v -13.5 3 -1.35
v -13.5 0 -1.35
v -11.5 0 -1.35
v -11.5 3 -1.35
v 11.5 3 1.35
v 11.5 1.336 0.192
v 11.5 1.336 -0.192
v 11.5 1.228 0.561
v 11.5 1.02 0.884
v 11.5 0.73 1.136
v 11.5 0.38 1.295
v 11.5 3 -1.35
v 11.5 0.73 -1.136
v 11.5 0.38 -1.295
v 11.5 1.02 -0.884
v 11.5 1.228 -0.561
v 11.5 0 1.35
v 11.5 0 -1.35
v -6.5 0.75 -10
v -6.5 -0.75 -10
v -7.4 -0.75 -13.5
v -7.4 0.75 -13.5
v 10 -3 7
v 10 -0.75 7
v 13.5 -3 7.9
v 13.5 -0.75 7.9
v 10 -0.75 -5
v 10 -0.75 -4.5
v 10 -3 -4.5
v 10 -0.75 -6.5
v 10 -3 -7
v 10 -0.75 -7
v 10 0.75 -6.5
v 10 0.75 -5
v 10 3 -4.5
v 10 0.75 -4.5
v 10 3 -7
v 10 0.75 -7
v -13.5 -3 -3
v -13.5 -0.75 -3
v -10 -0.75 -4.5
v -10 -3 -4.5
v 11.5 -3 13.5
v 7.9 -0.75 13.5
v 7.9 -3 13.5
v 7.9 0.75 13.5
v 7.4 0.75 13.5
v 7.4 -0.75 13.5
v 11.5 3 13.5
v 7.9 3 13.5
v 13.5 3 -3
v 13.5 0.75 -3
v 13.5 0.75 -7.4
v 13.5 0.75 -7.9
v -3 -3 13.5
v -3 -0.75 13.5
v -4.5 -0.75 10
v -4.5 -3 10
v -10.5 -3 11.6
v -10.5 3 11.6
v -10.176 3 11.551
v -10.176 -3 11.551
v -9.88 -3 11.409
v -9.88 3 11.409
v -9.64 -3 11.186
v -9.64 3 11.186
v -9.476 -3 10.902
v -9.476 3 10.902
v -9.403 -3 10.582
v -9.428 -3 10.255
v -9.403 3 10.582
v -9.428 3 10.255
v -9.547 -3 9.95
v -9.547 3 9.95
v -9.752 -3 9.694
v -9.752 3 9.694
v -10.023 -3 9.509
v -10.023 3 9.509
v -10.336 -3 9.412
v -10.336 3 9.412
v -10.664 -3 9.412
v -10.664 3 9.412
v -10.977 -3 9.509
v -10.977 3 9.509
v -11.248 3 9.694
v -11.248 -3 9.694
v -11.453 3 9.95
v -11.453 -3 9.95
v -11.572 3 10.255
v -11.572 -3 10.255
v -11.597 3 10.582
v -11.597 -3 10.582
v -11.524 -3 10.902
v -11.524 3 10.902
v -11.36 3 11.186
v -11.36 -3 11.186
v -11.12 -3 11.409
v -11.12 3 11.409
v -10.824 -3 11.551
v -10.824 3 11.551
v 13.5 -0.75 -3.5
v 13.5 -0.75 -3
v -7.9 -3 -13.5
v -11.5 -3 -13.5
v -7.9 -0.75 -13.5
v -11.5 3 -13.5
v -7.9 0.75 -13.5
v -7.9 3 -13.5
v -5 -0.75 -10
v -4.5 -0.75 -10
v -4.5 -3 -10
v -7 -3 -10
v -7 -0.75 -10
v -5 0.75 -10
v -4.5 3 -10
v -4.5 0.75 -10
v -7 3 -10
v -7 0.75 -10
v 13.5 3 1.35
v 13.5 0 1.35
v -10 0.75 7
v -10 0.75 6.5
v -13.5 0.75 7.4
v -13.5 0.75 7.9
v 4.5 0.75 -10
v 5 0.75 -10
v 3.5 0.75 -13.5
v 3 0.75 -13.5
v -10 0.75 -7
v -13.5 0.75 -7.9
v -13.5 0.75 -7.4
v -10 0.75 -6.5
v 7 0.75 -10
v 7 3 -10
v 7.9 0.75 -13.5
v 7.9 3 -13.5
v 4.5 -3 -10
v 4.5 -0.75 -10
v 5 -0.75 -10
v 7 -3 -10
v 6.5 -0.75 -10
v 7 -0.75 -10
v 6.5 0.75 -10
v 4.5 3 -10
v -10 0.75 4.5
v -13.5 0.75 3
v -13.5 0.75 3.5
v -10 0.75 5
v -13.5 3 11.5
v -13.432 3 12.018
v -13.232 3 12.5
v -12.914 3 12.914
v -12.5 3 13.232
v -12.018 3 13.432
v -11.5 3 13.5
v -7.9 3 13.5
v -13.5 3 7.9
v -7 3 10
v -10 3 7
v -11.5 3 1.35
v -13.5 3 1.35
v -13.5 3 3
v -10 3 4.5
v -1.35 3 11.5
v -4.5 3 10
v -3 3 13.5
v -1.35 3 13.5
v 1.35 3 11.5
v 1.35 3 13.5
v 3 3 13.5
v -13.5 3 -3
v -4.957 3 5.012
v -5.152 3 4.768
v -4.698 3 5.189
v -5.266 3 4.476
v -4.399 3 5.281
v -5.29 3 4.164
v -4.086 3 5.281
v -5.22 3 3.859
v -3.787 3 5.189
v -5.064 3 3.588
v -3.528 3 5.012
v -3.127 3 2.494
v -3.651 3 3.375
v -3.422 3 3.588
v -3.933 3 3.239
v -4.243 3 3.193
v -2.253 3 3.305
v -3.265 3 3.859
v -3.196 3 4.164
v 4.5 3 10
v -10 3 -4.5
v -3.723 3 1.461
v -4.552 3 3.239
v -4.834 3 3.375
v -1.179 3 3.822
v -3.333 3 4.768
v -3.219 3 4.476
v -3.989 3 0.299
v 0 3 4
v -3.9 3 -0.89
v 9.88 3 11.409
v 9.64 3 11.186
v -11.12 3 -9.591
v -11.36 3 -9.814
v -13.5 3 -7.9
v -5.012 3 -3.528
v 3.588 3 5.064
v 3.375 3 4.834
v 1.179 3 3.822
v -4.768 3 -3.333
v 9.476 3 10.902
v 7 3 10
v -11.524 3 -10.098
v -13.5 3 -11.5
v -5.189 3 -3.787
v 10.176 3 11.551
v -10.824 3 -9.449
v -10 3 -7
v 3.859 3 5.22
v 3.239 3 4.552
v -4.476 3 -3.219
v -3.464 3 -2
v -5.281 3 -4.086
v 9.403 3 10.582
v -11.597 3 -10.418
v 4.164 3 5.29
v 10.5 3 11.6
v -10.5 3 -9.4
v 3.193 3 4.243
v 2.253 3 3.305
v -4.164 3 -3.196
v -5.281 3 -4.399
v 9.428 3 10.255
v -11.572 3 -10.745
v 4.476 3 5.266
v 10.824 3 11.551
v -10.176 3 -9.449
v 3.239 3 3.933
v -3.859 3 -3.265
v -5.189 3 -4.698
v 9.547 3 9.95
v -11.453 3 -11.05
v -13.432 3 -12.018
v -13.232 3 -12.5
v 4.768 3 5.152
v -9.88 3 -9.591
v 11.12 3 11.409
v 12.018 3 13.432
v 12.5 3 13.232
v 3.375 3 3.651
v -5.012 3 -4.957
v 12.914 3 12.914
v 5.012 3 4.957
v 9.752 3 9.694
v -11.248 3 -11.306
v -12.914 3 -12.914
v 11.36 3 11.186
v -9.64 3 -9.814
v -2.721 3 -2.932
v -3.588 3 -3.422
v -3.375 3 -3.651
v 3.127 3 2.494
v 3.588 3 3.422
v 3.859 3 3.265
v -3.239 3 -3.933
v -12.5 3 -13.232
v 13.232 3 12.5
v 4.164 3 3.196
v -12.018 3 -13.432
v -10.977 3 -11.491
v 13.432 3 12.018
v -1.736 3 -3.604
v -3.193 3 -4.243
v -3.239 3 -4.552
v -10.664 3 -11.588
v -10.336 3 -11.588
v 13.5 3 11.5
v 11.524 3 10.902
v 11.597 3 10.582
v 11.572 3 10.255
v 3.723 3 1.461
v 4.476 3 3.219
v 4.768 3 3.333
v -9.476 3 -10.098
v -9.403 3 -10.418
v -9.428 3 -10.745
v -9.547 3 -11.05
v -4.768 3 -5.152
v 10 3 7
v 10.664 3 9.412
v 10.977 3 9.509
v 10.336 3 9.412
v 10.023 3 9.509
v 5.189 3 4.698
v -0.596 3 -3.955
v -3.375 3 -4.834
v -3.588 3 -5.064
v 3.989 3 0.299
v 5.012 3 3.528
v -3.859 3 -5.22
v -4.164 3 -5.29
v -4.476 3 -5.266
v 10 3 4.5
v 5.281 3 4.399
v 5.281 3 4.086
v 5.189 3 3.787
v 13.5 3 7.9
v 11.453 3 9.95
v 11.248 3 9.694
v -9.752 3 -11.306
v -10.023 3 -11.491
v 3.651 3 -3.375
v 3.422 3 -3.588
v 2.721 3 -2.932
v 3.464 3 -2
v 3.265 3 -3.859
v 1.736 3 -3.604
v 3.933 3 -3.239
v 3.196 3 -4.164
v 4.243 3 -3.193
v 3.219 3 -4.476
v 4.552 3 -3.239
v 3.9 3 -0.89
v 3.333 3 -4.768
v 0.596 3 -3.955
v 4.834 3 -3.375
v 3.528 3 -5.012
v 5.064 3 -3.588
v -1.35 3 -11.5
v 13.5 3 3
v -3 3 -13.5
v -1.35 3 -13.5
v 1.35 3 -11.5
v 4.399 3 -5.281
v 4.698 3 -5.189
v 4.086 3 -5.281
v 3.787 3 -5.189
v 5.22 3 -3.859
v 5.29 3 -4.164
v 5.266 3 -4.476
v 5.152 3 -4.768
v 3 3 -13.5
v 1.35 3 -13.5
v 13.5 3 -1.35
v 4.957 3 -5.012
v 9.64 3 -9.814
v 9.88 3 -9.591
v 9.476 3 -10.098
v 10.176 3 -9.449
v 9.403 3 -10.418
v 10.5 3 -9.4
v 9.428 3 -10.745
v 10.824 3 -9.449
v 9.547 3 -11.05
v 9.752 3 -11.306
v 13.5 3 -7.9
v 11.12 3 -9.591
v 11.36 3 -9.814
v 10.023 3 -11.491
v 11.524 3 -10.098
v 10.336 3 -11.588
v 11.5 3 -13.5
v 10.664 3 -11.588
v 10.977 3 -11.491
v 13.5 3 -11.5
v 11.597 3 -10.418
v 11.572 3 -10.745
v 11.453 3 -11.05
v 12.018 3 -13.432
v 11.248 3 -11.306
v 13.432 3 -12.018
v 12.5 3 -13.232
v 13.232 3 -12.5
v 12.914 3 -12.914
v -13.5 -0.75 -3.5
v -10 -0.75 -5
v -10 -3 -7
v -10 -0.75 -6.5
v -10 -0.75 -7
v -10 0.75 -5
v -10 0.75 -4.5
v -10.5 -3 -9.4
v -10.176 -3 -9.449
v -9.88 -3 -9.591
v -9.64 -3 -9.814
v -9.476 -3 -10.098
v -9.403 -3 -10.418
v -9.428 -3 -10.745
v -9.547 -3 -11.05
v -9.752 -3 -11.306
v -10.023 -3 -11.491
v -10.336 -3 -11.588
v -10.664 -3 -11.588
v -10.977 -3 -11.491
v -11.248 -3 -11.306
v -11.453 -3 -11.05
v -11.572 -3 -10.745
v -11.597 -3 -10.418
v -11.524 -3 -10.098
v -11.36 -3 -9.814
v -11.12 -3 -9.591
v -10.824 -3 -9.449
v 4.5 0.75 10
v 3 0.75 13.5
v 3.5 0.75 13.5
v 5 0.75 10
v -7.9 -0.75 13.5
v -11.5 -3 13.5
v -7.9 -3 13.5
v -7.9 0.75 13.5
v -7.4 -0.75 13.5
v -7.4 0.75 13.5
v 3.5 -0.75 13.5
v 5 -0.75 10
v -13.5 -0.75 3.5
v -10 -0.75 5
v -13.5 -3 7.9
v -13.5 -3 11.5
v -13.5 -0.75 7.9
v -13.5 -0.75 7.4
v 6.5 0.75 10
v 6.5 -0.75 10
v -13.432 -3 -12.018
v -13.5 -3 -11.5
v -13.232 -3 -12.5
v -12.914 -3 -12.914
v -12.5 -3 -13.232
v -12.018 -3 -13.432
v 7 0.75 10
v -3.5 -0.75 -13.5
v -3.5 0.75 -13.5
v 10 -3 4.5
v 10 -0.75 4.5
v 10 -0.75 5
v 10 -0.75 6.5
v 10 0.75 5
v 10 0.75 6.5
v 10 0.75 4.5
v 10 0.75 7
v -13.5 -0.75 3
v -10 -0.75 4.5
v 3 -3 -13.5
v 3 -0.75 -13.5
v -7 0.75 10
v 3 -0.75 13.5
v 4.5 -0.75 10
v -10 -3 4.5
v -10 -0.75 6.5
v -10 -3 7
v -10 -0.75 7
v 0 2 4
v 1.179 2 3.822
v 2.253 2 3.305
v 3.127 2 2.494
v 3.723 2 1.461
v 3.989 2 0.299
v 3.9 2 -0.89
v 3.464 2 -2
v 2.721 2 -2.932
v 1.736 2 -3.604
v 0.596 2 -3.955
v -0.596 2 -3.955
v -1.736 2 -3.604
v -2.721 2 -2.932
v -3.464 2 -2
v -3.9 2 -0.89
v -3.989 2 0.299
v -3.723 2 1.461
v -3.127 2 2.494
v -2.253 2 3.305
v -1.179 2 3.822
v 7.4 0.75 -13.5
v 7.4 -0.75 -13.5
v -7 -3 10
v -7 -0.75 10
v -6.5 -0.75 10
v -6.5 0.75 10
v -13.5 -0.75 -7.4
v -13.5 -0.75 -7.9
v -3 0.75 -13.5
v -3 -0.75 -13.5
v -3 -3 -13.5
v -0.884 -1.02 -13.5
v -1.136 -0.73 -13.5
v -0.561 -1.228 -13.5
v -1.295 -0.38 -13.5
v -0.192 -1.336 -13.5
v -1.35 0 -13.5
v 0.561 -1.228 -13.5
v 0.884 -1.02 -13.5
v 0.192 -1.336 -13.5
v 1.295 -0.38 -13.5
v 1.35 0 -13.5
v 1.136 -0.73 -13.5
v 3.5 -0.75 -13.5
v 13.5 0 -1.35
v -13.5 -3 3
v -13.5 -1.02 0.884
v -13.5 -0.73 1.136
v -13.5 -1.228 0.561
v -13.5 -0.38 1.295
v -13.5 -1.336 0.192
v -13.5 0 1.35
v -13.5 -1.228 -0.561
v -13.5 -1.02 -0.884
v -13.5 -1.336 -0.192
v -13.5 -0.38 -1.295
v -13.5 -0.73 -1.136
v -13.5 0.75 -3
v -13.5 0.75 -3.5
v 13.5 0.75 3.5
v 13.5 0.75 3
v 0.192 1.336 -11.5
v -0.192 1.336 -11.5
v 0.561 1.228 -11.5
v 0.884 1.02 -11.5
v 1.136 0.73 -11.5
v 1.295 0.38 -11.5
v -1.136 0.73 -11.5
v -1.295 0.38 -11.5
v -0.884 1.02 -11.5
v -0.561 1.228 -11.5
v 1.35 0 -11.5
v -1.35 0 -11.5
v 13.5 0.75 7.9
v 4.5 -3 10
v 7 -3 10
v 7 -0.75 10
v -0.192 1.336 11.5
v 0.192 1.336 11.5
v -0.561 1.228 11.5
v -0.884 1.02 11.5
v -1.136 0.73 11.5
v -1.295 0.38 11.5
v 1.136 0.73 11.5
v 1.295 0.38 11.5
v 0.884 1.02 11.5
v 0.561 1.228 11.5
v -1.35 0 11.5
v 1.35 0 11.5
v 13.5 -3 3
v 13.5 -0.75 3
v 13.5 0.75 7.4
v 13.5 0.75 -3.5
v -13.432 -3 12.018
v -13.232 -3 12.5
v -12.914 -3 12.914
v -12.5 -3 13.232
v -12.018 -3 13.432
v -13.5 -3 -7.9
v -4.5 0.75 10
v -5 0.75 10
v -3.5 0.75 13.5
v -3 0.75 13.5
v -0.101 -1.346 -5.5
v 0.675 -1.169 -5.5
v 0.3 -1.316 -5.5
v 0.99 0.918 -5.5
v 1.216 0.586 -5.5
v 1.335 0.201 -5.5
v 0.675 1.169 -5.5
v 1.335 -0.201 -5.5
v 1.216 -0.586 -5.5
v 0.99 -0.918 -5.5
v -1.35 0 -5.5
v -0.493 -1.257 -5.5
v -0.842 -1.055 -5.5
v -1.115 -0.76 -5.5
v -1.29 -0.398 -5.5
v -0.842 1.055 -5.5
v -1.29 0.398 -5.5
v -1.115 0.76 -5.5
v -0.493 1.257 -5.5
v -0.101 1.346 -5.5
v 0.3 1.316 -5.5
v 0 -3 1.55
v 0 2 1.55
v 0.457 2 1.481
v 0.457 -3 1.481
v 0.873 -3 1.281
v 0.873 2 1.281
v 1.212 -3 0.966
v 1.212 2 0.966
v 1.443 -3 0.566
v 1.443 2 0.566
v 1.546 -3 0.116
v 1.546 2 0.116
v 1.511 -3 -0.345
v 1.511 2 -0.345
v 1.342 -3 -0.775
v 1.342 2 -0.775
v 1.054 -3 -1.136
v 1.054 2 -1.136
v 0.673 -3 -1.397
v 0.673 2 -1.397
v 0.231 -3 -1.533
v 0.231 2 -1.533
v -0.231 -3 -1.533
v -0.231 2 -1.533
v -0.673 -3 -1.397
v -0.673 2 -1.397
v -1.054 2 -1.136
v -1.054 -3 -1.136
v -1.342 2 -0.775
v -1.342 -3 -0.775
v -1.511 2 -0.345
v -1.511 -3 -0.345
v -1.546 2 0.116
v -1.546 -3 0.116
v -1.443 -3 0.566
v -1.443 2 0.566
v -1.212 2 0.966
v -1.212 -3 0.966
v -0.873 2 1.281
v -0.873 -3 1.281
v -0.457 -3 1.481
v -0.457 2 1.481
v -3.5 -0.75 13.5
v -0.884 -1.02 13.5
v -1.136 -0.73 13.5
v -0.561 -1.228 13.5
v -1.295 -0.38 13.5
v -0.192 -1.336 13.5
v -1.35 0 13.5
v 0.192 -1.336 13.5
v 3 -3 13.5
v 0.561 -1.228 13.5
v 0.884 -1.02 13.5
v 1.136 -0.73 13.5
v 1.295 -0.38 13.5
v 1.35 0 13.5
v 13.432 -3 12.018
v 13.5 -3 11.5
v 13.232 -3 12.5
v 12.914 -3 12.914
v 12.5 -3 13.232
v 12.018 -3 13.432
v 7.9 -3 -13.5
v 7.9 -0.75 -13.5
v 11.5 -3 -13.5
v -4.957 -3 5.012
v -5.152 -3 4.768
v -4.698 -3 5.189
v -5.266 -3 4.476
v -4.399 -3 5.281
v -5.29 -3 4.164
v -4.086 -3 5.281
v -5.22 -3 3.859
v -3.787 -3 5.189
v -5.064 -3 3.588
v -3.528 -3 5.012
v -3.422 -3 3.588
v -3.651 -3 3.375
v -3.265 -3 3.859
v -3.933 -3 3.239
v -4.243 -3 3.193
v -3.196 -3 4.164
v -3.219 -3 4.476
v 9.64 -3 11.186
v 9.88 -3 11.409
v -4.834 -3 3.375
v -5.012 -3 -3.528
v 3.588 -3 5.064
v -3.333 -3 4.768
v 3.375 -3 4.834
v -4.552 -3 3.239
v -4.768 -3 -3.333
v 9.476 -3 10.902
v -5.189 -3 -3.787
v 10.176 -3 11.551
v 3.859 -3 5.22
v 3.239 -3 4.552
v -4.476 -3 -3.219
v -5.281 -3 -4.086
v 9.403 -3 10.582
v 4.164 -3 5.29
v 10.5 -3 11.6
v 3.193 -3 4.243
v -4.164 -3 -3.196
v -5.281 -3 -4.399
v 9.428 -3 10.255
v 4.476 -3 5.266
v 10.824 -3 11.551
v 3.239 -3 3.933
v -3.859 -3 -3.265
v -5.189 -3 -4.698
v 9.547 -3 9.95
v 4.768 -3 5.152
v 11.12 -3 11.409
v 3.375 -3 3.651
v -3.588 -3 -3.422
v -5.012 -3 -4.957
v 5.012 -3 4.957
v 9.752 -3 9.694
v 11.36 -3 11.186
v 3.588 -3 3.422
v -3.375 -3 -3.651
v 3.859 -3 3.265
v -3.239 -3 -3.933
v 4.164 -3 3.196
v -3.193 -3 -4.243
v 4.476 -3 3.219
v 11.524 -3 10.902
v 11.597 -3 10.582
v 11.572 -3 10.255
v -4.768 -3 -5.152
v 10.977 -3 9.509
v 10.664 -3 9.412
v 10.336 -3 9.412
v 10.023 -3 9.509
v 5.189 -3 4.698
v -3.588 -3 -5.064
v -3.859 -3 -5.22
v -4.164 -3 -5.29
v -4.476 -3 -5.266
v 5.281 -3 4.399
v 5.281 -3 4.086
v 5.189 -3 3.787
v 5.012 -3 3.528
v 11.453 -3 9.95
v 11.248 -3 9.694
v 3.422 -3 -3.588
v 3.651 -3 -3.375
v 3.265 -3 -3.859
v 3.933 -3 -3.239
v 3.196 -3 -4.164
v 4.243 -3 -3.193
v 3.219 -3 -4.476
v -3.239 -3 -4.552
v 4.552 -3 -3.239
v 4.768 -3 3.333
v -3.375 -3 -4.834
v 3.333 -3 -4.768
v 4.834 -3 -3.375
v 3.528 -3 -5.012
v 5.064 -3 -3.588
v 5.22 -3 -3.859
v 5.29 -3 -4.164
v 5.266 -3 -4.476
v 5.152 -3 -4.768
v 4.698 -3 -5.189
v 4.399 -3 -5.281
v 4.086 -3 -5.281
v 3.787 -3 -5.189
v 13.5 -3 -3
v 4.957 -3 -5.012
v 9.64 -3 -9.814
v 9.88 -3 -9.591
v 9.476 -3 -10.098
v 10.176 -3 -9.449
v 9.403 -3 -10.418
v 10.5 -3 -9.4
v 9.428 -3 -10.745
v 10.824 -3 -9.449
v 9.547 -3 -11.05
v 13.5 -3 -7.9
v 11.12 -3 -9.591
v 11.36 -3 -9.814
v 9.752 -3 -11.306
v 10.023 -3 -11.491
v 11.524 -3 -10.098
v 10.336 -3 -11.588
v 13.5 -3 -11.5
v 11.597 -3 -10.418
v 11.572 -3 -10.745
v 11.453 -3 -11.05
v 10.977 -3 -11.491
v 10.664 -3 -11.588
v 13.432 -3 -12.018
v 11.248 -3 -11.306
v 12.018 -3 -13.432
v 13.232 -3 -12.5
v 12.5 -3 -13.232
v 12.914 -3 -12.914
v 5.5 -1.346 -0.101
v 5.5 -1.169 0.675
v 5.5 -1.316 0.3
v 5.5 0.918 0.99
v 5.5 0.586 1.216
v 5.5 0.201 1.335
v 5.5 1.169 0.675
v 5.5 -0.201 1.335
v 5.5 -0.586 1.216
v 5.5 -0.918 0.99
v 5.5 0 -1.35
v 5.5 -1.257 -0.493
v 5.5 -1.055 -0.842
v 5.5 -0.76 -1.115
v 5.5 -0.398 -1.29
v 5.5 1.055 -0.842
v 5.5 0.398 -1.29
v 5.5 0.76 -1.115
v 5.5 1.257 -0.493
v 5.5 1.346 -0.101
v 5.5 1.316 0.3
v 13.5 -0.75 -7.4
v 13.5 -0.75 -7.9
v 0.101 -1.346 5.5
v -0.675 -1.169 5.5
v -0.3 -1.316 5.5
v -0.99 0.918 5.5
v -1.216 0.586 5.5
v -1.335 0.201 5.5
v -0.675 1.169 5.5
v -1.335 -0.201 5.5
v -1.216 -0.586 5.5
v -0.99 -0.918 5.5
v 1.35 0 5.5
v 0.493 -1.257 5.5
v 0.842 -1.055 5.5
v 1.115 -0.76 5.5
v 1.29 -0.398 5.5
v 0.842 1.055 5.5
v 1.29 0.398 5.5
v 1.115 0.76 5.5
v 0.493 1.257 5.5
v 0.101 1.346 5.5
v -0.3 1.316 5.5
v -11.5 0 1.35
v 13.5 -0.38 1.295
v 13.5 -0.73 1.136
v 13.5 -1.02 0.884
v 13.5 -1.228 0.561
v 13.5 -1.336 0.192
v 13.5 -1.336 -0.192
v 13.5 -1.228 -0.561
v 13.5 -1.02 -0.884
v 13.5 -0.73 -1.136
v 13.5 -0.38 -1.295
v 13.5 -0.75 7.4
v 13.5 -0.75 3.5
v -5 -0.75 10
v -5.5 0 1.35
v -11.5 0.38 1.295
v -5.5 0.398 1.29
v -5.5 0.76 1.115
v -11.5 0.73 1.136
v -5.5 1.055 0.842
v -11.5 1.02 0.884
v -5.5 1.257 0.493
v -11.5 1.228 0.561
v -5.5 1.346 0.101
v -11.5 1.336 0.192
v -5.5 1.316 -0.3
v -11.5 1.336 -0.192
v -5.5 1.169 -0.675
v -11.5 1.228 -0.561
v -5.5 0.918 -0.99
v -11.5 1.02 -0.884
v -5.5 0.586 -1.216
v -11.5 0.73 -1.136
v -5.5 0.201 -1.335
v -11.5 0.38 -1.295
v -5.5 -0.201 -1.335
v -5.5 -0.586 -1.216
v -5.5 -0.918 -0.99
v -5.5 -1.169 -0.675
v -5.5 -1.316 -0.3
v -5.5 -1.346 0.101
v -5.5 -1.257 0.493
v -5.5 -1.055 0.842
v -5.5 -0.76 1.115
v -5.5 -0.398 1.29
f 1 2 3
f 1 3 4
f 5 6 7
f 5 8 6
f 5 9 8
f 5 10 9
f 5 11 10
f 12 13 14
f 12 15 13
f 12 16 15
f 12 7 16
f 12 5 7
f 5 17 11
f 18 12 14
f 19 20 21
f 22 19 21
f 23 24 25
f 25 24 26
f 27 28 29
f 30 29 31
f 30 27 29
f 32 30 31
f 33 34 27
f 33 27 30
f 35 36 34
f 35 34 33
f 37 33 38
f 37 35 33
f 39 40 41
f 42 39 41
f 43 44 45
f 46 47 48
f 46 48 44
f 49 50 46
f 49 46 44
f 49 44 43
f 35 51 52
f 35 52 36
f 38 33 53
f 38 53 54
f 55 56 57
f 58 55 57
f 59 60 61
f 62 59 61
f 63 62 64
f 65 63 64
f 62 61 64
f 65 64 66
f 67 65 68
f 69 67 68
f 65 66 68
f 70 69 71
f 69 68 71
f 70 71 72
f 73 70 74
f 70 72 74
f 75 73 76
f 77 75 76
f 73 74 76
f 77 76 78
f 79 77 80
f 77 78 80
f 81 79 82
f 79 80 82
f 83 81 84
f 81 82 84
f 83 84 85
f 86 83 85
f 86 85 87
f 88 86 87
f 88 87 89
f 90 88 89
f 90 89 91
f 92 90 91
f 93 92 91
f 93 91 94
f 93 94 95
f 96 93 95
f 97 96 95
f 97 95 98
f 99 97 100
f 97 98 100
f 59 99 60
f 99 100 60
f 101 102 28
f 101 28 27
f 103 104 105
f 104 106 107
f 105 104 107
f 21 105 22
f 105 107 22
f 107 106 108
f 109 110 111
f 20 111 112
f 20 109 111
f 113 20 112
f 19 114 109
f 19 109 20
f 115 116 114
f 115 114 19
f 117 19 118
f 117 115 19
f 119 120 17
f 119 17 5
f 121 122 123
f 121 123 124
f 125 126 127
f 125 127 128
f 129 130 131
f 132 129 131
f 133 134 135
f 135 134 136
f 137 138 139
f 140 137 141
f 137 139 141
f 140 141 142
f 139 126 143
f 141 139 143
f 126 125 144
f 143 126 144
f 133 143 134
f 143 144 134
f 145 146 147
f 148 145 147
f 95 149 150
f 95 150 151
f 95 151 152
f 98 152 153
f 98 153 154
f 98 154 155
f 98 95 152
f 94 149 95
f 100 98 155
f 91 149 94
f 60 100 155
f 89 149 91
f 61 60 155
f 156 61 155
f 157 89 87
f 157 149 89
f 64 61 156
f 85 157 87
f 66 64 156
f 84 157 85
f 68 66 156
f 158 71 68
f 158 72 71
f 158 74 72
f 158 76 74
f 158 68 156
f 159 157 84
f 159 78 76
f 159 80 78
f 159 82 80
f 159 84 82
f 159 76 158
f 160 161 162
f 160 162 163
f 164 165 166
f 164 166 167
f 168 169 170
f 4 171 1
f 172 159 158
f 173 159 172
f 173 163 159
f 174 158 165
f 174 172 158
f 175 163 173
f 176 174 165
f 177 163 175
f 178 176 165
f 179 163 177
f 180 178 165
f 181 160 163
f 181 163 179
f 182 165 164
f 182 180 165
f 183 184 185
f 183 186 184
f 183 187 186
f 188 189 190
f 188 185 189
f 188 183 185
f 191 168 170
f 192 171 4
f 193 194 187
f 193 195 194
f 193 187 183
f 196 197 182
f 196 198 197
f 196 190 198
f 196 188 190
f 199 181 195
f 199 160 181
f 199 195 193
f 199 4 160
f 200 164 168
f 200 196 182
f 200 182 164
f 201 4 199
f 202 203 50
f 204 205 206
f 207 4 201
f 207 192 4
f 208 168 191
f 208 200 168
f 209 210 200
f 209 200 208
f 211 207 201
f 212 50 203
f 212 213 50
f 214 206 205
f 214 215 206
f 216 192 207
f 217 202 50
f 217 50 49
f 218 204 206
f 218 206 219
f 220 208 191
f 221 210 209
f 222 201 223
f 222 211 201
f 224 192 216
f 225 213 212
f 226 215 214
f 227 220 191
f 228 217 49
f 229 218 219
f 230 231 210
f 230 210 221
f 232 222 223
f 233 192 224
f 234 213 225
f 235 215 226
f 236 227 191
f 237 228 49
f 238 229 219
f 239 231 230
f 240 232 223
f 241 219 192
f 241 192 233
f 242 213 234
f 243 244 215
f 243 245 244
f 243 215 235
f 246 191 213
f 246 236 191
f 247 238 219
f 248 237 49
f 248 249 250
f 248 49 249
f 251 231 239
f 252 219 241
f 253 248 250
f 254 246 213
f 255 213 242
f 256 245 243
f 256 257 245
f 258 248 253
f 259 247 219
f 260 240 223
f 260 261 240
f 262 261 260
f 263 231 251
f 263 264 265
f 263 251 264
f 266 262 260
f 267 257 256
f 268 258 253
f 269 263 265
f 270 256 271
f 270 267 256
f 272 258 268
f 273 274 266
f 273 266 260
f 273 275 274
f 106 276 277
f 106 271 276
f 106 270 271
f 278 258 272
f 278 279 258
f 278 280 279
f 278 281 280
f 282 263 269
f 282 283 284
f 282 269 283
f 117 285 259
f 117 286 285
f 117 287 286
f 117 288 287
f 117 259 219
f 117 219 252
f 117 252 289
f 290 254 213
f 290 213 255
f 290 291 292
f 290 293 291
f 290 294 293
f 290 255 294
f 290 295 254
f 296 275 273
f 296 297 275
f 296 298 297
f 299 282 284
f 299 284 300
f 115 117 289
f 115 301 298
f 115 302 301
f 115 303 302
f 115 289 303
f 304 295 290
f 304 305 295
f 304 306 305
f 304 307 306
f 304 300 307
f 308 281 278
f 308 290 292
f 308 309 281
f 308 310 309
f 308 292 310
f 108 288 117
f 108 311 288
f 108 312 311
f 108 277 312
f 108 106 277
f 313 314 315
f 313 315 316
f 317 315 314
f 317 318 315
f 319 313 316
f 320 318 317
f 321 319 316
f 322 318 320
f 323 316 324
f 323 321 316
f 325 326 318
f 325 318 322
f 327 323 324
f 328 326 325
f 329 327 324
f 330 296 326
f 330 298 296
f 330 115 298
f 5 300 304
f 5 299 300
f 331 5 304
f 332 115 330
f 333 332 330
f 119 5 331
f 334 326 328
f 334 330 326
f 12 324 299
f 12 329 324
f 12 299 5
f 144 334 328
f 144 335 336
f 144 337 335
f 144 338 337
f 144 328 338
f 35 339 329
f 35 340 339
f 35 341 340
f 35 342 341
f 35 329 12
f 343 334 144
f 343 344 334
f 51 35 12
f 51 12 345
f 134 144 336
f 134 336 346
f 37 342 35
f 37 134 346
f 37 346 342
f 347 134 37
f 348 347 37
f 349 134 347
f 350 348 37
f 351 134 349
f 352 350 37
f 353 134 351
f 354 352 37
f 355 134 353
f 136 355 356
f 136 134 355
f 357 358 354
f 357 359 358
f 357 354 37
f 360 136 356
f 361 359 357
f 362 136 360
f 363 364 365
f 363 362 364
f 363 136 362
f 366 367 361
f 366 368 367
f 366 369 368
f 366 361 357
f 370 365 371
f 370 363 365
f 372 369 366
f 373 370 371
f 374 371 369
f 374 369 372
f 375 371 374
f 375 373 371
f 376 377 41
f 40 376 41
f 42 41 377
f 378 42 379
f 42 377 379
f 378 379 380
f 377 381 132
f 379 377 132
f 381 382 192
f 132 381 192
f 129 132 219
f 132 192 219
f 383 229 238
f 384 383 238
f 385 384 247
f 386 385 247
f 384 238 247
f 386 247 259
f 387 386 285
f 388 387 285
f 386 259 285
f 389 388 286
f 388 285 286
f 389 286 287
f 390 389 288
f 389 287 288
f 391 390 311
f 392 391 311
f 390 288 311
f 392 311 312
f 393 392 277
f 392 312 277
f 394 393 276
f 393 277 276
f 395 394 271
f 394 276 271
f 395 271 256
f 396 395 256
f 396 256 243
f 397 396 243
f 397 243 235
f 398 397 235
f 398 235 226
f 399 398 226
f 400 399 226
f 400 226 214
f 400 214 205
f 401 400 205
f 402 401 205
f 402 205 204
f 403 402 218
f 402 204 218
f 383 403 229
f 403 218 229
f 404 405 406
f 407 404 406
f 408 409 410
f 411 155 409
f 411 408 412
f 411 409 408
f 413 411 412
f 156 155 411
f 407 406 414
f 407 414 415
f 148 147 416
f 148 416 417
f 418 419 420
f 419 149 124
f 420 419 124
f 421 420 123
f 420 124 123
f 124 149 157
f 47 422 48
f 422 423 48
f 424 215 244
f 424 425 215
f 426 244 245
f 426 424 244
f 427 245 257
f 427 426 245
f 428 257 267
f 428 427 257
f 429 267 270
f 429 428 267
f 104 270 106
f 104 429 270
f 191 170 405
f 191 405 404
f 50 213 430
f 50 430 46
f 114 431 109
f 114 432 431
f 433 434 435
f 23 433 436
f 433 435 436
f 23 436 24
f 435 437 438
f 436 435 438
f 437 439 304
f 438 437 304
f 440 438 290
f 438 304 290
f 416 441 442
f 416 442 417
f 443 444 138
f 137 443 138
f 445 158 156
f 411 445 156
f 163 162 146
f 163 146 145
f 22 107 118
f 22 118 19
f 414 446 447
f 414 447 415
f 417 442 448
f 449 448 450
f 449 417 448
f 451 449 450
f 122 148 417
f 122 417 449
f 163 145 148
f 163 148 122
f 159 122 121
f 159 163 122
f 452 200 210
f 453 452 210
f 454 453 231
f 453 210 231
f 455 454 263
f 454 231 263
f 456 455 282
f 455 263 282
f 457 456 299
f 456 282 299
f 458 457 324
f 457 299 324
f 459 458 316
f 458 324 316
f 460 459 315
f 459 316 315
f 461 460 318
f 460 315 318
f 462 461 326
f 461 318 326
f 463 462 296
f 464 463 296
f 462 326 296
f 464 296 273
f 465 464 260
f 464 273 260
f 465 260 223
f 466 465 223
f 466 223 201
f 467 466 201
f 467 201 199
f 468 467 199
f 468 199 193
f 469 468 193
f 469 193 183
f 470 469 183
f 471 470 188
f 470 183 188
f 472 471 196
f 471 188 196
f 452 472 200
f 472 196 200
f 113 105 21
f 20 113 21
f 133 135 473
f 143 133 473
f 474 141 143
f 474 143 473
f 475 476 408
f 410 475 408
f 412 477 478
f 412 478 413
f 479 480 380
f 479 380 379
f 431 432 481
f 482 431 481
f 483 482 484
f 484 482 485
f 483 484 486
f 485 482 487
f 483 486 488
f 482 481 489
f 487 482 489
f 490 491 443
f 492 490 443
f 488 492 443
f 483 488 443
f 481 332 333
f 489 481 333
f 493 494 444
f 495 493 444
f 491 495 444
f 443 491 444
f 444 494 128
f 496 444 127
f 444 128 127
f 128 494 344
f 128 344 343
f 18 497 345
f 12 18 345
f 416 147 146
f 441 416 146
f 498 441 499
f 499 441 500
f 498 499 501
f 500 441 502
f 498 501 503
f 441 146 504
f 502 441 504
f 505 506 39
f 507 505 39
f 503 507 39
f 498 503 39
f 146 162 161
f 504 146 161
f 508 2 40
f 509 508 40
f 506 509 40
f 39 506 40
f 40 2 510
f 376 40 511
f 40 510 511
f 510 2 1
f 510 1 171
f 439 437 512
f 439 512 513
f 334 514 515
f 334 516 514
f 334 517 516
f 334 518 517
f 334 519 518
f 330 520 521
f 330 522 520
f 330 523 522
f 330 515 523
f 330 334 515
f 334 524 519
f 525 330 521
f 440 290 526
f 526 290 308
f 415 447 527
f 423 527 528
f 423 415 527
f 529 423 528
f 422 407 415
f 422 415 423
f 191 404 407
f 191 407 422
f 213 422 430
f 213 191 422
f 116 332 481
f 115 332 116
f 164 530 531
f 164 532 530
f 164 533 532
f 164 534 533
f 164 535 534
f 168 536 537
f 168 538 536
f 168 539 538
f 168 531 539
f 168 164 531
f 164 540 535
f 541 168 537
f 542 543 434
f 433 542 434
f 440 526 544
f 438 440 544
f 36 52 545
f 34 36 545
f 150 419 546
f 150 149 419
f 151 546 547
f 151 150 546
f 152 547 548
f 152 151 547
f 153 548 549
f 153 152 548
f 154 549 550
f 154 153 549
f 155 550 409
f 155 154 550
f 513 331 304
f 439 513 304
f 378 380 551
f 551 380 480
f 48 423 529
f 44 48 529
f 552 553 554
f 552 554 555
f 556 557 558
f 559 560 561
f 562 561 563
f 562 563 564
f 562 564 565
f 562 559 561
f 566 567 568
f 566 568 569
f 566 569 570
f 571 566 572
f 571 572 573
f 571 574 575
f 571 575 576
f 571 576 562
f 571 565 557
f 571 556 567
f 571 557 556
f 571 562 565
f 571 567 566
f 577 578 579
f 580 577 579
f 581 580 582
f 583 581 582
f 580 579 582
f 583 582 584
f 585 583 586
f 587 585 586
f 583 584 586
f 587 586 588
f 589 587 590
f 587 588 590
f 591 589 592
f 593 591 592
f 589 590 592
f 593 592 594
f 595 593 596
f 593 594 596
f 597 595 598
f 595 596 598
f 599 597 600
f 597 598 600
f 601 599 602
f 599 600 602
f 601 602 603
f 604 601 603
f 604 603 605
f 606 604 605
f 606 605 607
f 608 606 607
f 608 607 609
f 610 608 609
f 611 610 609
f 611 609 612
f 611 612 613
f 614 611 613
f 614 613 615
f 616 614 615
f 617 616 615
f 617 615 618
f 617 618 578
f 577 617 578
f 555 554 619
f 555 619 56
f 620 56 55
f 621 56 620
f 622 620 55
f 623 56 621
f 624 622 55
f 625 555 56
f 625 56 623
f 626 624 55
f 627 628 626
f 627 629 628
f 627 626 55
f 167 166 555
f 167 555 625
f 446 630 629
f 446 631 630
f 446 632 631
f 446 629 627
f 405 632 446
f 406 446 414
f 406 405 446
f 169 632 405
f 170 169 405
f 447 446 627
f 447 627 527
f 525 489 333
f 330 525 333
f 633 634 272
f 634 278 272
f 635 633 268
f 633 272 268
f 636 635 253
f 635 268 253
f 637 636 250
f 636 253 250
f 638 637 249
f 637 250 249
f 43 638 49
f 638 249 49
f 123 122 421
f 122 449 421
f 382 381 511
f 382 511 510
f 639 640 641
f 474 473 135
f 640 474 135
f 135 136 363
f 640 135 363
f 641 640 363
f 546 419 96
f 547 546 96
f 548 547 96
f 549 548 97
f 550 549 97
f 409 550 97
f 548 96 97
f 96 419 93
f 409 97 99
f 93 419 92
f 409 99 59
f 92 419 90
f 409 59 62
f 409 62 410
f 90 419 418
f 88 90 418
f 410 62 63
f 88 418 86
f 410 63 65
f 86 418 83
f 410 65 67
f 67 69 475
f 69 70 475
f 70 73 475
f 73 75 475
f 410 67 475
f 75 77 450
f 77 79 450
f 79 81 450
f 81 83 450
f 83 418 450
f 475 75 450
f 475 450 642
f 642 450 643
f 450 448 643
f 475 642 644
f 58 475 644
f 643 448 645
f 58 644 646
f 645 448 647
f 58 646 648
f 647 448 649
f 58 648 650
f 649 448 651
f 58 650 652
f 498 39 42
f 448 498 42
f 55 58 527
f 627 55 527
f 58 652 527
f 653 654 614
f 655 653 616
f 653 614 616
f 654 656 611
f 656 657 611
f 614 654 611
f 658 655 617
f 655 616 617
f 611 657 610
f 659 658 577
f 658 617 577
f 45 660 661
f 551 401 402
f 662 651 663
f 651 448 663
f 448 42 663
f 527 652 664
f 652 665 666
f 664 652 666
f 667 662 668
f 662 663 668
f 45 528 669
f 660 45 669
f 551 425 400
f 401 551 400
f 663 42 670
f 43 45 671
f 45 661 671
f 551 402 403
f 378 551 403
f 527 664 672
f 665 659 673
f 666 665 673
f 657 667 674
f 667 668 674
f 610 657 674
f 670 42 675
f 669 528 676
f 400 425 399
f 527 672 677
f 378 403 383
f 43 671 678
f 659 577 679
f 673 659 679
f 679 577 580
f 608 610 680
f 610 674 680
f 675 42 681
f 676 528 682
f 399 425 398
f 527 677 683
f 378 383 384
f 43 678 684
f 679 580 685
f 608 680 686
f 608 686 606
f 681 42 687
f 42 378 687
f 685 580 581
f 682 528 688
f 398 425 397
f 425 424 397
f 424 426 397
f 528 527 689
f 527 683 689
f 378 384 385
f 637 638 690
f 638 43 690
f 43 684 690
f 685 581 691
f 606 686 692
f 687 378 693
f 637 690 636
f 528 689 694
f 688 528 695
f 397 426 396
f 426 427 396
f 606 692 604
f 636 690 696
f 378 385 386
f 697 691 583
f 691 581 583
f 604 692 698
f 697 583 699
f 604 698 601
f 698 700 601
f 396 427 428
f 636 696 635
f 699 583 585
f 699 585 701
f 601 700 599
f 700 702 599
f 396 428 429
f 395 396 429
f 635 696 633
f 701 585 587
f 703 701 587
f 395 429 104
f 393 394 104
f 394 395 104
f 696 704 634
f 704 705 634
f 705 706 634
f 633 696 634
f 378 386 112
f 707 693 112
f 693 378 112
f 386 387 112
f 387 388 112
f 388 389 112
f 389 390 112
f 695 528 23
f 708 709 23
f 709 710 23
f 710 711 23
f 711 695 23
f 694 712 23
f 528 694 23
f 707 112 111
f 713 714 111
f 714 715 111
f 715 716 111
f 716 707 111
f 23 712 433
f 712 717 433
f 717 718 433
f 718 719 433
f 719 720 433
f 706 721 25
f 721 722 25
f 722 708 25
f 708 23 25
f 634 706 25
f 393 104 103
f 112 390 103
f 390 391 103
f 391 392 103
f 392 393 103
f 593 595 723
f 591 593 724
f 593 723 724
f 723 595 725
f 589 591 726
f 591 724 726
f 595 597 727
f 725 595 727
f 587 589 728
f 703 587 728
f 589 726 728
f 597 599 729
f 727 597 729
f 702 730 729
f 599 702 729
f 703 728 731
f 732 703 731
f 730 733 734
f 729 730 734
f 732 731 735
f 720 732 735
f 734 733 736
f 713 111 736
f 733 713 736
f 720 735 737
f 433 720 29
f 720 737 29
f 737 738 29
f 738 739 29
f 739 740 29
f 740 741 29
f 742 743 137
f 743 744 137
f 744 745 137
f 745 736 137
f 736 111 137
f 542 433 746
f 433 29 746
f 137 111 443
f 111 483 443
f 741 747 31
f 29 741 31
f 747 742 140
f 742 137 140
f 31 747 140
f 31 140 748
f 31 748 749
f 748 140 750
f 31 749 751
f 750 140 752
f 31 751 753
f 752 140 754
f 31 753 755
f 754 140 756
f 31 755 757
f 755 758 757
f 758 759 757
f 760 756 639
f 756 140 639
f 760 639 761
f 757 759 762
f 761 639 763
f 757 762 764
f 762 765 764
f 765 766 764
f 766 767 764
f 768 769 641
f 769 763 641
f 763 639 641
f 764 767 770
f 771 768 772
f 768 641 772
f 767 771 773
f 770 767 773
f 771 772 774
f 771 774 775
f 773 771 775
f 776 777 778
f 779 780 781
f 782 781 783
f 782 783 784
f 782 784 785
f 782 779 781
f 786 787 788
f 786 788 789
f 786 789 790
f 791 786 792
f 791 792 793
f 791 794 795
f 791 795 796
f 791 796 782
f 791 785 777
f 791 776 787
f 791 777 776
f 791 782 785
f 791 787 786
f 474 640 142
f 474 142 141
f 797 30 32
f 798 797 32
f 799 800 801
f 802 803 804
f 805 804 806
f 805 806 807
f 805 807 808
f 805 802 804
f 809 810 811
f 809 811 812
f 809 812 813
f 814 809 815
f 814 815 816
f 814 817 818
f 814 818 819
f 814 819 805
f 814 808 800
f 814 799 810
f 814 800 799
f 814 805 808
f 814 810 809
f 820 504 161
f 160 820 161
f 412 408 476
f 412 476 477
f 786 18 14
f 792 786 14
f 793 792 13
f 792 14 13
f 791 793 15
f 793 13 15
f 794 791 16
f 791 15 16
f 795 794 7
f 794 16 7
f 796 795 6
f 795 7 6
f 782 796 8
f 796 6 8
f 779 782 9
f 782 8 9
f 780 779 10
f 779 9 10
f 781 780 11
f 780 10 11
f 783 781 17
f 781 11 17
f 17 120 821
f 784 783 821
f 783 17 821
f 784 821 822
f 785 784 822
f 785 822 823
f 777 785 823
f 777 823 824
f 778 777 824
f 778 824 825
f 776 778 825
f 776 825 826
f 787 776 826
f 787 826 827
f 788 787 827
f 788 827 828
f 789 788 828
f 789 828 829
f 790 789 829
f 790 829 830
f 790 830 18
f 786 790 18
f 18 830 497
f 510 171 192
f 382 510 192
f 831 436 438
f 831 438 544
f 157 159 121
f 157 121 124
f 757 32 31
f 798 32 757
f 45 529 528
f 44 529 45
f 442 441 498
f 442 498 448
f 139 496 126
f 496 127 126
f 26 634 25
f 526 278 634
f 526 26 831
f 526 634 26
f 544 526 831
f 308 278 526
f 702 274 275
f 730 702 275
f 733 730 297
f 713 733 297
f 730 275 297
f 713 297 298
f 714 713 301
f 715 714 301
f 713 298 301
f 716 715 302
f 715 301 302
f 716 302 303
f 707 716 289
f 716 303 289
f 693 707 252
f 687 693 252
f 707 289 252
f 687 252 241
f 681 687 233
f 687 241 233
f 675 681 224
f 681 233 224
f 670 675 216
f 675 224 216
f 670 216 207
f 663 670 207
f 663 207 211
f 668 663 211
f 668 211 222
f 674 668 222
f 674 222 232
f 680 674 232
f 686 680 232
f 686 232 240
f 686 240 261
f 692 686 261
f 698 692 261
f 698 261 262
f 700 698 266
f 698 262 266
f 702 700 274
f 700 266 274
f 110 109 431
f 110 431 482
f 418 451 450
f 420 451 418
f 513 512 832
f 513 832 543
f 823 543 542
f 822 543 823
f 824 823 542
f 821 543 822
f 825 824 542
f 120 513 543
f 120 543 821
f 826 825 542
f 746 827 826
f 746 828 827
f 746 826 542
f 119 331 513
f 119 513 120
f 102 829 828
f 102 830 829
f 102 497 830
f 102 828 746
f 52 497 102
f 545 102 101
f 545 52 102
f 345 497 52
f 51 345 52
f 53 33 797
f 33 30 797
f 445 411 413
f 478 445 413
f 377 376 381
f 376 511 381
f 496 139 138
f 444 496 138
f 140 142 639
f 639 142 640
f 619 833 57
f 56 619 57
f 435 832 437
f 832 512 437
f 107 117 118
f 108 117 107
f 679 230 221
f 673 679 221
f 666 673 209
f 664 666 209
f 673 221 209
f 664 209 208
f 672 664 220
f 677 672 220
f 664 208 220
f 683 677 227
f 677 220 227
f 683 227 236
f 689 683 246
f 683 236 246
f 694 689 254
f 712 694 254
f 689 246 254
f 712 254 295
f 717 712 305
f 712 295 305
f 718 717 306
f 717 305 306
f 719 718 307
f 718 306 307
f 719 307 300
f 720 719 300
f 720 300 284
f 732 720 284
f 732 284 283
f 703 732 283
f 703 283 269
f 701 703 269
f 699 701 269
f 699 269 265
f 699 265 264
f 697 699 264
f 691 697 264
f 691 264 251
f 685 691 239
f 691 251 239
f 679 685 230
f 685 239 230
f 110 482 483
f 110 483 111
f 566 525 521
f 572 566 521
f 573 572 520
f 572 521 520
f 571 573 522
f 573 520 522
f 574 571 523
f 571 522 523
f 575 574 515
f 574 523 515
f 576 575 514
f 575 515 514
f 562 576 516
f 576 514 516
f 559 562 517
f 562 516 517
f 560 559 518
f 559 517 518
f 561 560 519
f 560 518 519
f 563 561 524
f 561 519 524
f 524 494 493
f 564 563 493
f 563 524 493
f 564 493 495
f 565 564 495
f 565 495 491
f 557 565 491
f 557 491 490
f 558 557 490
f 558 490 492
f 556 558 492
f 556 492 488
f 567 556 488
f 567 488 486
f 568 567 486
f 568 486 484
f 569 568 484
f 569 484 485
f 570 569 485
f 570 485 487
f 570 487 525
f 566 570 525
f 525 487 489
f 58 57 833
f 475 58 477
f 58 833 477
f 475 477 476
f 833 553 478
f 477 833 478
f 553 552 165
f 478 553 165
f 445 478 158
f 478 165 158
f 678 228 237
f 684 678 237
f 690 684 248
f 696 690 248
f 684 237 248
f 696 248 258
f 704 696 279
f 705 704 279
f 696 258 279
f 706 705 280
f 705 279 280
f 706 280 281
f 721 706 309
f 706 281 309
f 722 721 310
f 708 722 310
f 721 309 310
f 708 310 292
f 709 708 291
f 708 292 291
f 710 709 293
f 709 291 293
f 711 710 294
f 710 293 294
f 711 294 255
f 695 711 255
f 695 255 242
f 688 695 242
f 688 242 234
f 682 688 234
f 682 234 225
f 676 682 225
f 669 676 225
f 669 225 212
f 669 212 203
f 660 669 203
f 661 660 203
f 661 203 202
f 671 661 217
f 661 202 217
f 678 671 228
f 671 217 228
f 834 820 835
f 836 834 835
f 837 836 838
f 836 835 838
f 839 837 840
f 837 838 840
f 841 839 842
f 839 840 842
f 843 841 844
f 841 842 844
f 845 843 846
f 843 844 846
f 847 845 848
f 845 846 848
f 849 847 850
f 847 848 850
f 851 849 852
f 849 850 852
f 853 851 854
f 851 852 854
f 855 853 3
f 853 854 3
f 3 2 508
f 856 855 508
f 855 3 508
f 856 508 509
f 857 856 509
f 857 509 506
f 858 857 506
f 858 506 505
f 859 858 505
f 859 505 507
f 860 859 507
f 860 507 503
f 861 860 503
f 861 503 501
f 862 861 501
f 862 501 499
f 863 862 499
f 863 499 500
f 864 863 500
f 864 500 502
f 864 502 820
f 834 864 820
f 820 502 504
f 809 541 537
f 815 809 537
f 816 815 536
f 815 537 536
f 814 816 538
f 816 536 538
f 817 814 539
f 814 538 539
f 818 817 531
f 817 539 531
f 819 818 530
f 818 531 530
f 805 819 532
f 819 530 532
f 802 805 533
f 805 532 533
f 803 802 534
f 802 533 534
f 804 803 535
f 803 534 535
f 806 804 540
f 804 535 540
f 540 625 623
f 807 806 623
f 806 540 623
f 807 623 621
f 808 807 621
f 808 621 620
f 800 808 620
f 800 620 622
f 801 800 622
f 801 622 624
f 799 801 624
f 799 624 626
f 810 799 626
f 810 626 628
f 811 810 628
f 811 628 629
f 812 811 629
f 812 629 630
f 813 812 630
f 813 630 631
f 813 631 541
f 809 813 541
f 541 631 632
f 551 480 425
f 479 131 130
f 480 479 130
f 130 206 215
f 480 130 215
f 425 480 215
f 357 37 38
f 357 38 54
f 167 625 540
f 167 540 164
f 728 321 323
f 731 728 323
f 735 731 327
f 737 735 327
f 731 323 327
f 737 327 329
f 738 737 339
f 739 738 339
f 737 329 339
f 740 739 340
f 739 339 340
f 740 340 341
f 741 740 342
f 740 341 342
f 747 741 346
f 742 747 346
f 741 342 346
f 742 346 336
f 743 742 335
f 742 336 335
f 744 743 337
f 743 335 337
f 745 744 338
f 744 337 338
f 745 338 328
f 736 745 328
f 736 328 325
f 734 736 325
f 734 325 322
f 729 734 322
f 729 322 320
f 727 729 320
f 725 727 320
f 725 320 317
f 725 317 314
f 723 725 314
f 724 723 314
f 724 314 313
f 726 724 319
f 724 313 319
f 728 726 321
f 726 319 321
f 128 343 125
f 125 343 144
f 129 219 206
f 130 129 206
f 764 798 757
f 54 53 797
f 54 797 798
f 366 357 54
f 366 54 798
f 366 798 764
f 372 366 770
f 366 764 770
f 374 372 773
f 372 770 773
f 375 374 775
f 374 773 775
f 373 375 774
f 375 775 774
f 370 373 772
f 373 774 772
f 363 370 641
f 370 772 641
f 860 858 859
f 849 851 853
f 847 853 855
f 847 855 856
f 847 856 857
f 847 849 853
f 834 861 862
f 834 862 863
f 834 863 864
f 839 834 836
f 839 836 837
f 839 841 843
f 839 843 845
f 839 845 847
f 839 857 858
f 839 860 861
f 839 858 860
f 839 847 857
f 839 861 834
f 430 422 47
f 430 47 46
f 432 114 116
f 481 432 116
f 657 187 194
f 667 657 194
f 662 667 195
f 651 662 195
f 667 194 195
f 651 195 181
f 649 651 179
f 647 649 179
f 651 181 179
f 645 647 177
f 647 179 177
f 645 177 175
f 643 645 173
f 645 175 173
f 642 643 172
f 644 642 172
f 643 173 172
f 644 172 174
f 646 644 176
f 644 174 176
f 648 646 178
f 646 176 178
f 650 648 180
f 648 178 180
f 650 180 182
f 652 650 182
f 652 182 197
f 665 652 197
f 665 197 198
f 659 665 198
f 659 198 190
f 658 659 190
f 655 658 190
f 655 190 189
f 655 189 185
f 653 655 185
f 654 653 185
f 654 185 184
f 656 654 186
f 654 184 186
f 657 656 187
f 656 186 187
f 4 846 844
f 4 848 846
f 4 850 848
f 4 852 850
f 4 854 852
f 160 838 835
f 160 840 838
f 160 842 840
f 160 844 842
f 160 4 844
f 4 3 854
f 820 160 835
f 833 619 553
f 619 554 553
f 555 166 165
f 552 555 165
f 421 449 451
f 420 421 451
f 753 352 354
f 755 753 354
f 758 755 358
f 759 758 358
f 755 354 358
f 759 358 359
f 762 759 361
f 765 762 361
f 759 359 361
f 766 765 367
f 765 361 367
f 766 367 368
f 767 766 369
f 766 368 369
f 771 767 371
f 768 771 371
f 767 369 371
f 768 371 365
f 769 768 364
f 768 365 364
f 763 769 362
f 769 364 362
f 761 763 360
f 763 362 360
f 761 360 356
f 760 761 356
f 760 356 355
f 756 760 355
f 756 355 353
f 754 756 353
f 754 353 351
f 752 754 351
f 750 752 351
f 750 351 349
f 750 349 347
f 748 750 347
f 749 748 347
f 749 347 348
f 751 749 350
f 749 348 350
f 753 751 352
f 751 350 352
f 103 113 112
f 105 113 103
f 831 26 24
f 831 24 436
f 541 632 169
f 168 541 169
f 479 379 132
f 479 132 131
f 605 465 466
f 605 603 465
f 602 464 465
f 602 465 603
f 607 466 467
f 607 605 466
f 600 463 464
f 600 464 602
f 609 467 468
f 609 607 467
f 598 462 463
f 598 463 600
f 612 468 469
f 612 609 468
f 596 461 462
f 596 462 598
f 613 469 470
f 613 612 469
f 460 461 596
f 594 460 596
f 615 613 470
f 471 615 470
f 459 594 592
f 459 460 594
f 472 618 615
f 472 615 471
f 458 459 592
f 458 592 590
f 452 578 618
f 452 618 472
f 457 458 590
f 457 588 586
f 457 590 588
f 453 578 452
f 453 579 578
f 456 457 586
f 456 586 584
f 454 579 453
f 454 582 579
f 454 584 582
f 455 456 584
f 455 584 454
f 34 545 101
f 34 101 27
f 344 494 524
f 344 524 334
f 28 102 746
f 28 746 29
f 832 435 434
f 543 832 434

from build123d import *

# Parameters (mm, degrees)
SKETCH_3_W                      = 27
SKETCH_3_H                      = 27
EXTRUDE_1_DEPTH                 = 3
FILLET_1_R                      = 2
SKETCH_4_R                      = 1.1
CUT_EXTRUDE_1_DEPTH             = 6
SKETCH_5_R                      = 1.55
CUT_EXTRUDE_2_DEPTH             = 6
SKETCH_6_R                      = 1.05
CUT_EXTRUDE_3_DEPTH             = 6
PATTERN_CIRCULAR_1_COUNT        = 4
SKETCH_7_R                      = 4
CUT_EXTRUDE_4_DEPTH             = 1
CUT_EXTRUDE_8_DEPTH             = 21.012496096
PATTERN_CIRCULAR_2_COUNT        = 4
PATTERN_CIRCULAR_2_COPY_1_DEPTH = 21.012496096
PATTERN_CIRCULAR_2_COPY_2_DEPTH = 21.012496096
PATTERN_CIRCULAR_2_COPY_3_DEPTH = 21.012496096
SKETCH_12_R                     = 1.35
CUT_EXTRUDE_9_DEPTH             = 8
PATTERN_CIRCULAR_3_COUNT        = 4
EXTRUDE_2_DEPTH                 = 0.75
PATTERN_CIRCULAR_4_COUNT        = 4
PATTERN_CIRCULAR_4_COPY_1_DEPTH = 0.75
PATTERN_CIRCULAR_4_COPY_2_DEPTH = 0.75
PATTERN_CIRCULAR_4_COPY_3_DEPTH = 0.75
SKETCH_22_W                     = 2.7
SKETCH_22_H                     = 3
CUT_EXTRUDE_15_DEPTH            = 2
PATTERN_CIRCULAR_11_COUNT       = 4


with BuildPart() as part:
    # ｽｹｯﾁ3 → ﾎﾞｽ - 押し出し1 (new, symmetric)
    with BuildSketch(Plane(origin=(0, 0, 0), x_dir=(1, 0, 0), z_dir=(0, 1, 0))):
        Rectangle(SKETCH_3_W, SKETCH_3_H)
    extrude(amount=EXTRUDE_1_DEPTH, both=True)

    # ﾌｨﾚｯﾄ1
    fillet_1_edges = [part.edges().sort_by_distance(p)[0] for p in [
        (13.5, 0, 13.5),
        (-13.5, 0, 13.5),
        (-13.5, 0, -13.5),
        (13.5, 0, -13.5),
    ]]
    fillet(fillet_1_edges, radius=FILLET_1_R)

    # ｽｹｯﾁ4 → ｶｯﾄ - 押し出し1 (cut)
    with BuildSketch(Plane(origin=(0, 3, 0), x_dir=(1, 0, 0), z_dir=(0, 1, 0))):
        with Locations(Location((-10.5, 10.5, 0), (0, 0, 270))):
            Circle(SKETCH_4_R)
        with Locations(Location((10.5, 10.5, 0), (0, 0, 270))):
            Circle(SKETCH_4_R)
        with Locations(Location((-10.5, -10.5, 0), (0, 0, 270))):
            Circle(SKETCH_4_R)
        with Locations(Location((10.5, -10.5, 0), (0, 0, 270))):
            Circle(SKETCH_4_R)
    extrude(amount=-CUT_EXTRUDE_1_DEPTH, mode=Mode.SUBTRACT)

    # ｽｹｯﾁ5 → ｶｯﾄ - 押し出し2 (cut)
    with BuildSketch(Plane(origin=(0, 3, 0), x_dir=(1, 0, 0), z_dir=(0, 1, 0))):
        with Locations(Location((0, 0, 0), (0, 0, 270))):
            Circle(SKETCH_5_R)
    extrude(amount=-CUT_EXTRUDE_2_DEPTH, mode=Mode.SUBTRACT)

    # ｽｹｯﾁ6 → ｶｯﾄ - 押し出し3 (cut)
    with BuildSketch(Plane(origin=(0, 3, 0), x_dir=(1, 0, 0), z_dir=(0, 1, 0))):
        with Locations(Location((4.242640687, 4.242640687, 0), (0, 0, 270))):
            Circle(SKETCH_6_R)
    cut_extrude_3 = extrude(amount=-CUT_EXTRUDE_3_DEPTH, mode=Mode.SUBTRACT)

    # 円形ﾊﾟﾀｰﾝ1: ｶｯﾄ - 押し出し3 ×4 about axis
    pattern_circular_1_axis = Axis((0, 0, 0), (0, 1, 0))
    for i in range(1, PATTERN_CIRCULAR_1_COUNT):
        add(cut_extrude_3.rotate(pattern_circular_1_axis, i * 360 / PATTERN_CIRCULAR_1_COUNT), mode=Mode.SUBTRACT)

    # ｽｹｯﾁ7 → ｶｯﾄ - 押し出し4 (cut)
    with BuildSketch(Plane(origin=(0, 3, 0), x_dir=(1, 0, 0), z_dir=(0, 1, 0))):
        with Locations(Location((0, 0, 0), (0, 0, 270))):
            Circle(SKETCH_7_R)
    extrude(amount=-CUT_EXTRUDE_4_DEPTH, mode=Mode.SUBTRACT)

    # ｽｹｯﾁ11 → ｶｯﾄ - 押し出し8 (cut, symmetric)
    with BuildSketch(Plane(origin=(0, 3, 0), x_dir=(1, 0, 0), z_dir=(0, 1, 0))):
        Polygon((-28.082033535, 86.024744916), (3, 13.5), (4.5, 10), (7, 10), (7.9, 13.5), (27.55047658, 89.918520033), (16.532211377, 247.342544779), (-39.100298738, 243.448769662), align=None)
    cut_extrude_8 = extrude(amount=CUT_EXTRUDE_8_DEPTH, both=True, mode=Mode.SUBTRACT)

    # ﾐﾗｰ1: ｶｯﾄ - 押し出し8 across plane
    add(cut_extrude_8.mirror(Plane(origin=(0, 0, 0), x_dir=(0, 0, 1), z_dir=(1, 0, 0))), mode=Mode.SUBTRACT)

    # 円形ﾊﾟﾀｰﾝ2: ｶｯﾄ - 押し出し8 ×4 about axis
    pattern_circular_2_axis = Axis((0, 0, 0), (0, 1, 0))
    for i in range(1, PATTERN_CIRCULAR_2_COUNT):
        add(cut_extrude_8.rotate(pattern_circular_2_axis, i * 360 / PATTERN_CIRCULAR_2_COUNT), mode=Mode.SUBTRACT)

    # 円形ﾊﾟﾀｰﾝ2 copy 1 sketch → 円形ﾊﾟﾀｰﾝ2 copy 1 (cut, symmetric)
    with BuildSketch(Plane.ZX.offset(3)):
        Polygon((-28.082033535, -86.024744916), (3, -13.5), (4.5, -10), (7, -10), (7.9, -13.5), (27.55047658, -89.918520033), (16.532211377, -247.342544779), (-39.100298738, -243.448769662), align=None)
    extrude(amount=PATTERN_CIRCULAR_2_COPY_1_DEPTH, both=True, mode=Mode.SUBTRACT)

    # 円形ﾊﾟﾀｰﾝ2 copy 2 sketch → 円形ﾊﾟﾀｰﾝ2 copy 2 (cut, symmetric)
    with BuildSketch(Plane(origin=(0, 3, 0), x_dir=(1, 0, 0), z_dir=(0, 1, 0))):
        Polygon((-28.082033535, -86.024744916), (3, -13.5), (4.5, -10), (7, -10), (7.9, -13.5), (27.55047658, -89.918520033), (16.532211377, -247.342544779), (-39.100298738, -243.448769662), align=None)
    extrude(amount=PATTERN_CIRCULAR_2_COPY_2_DEPTH, both=True, mode=Mode.SUBTRACT)

    # 円形ﾊﾟﾀｰﾝ2 copy 3 sketch → 円形ﾊﾟﾀｰﾝ2 copy 3 (cut, symmetric)
    with BuildSketch(Plane(origin=(0, 3, 0), x_dir=(0, 0, -1), z_dir=(0, 1, 0))):
        Polygon((-28.082033535, -86.024744916), (3, -13.5), (4.5, -10), (7, -10), (7.9, -13.5), (27.55047658, -89.918520033), (16.532211377, -247.342544779), (-39.100298738, -243.448769662), align=None)
    extrude(amount=PATTERN_CIRCULAR_2_COPY_3_DEPTH, both=True, mode=Mode.SUBTRACT)

    # ｽｹｯﾁ12 → ｶｯﾄ - 押し出し9 (cut)
    with BuildSketch(Plane.XY.offset(13.5)):
        Circle(SKETCH_12_R)
    cut_extrude_9 = extrude(amount=-CUT_EXTRUDE_9_DEPTH, mode=Mode.SUBTRACT)

    # 円形ﾊﾟﾀｰﾝ3: ｶｯﾄ - 押し出し9 ×4 about axis
    pattern_circular_3_axis = Axis((0, 0, 0), (0, 1, 0))
    for i in range(1, PATTERN_CIRCULAR_3_COUNT):
        add(cut_extrude_9.rotate(pattern_circular_3_axis, i * 360 / PATTERN_CIRCULAR_3_COUNT), mode=Mode.SUBTRACT)

    # ｽｹｯﾁ13 → ﾎﾞｽ - 押し出し2 (add, symmetric)
    with BuildSketch(Plane(origin=(0, 0, 0), x_dir=(1, 0, 0), z_dir=(0, 1, 0))):
        Polygon((7.9, 13.5), (7, 10), (6.5, 10), (7.4, 13.5), align=None)
        Polygon((3, 13.5), (3.5, 13.5), (5, 10), (4.5, 10), align=None)
    extrude_2 = extrude(amount=EXTRUDE_2_DEPTH, both=True)

    # ﾐﾗｰ2: ﾎﾞｽ - 押し出し2 across plane
    add(extrude_2.mirror(Plane(origin=(0, 0, 0), x_dir=(0, 0, 1), z_dir=(1, 0, 0))))

    # 円形ﾊﾟﾀｰﾝ4: ﾎﾞｽ - 押し出し2 ×4 about axis
    pattern_circular_4_axis = Axis((0, 0, 0), (0, 1, 0))
    for i in range(1, PATTERN_CIRCULAR_4_COUNT):
        add(extrude_2.rotate(pattern_circular_4_axis, i * 360 / PATTERN_CIRCULAR_4_COUNT))

    # 円形ﾊﾟﾀｰﾝ4 copy 1 sketch → 円形ﾊﾟﾀｰﾝ4 copy 1 (add, symmetric)
    with BuildSketch(Plane.ZX):
        Polygon((7.9, -13.5), (7, -10), (6.5, -10), (7.4, -13.5), align=None)
        Polygon((3, -13.5), (3.5, -13.5), (5, -10), (4.5, -10), align=None)
    extrude(amount=PATTERN_CIRCULAR_4_COPY_1_DEPTH, both=True)

    # 円形ﾊﾟﾀｰﾝ4 copy 2 sketch → 円形ﾊﾟﾀｰﾝ4 copy 2 (add, symmetric)
    with BuildSketch(Plane(origin=(0, 0, 0), x_dir=(1, 0, 0), z_dir=(0, 1, 0))):
        Polygon((7.9, -13.5), (7, -10), (6.5, -10), (7.4, -13.5), align=None)
        Polygon((3, -13.5), (3.5, -13.5), (5, -10), (4.5, -10), align=None)
    extrude(amount=PATTERN_CIRCULAR_4_COPY_2_DEPTH, both=True)

    # 円形ﾊﾟﾀｰﾝ4 copy 3 sketch → 円形ﾊﾟﾀｰﾝ4 copy 3 (add, symmetric)
    with BuildSketch(Plane(origin=(0, 0, 0), x_dir=(0, 0, -1), z_dir=(0, 1, 0))):
        Polygon((7.9, -13.5), (7, -10), (6.5, -10), (7.4, -13.5), align=None)
        Polygon((3, -13.5), (3.5, -13.5), (5, -10), (4.5, -10), align=None)
    extrude(amount=PATTERN_CIRCULAR_4_COPY_3_DEPTH, both=True)

    # ｽｹｯﾁ22 → ｶｯﾄ - 押し出し15 (cut)
    with BuildSketch(Plane.XY.offset(13.5)):
        with Locations((0, 1.5)):
            Rectangle(SKETCH_22_W, SKETCH_22_H)
    cut_extrude_15 = extrude(amount=-CUT_EXTRUDE_15_DEPTH, mode=Mode.SUBTRACT)

    # 円形ﾊﾟﾀｰﾝ11: ｶｯﾄ - 押し出し15 ×4 about axis
    pattern_circular_11_axis = Axis((0, 0, 0), (0, 1, 0))
    for i in range(1, PATTERN_CIRCULAR_11_COUNT):
        add(cut_extrude_15.rotate(pattern_circular_11_axis, i * 360 / PATTERN_CIRCULAR_11_COUNT), mode=Mode.SUBTRACT)


solid = part.part
